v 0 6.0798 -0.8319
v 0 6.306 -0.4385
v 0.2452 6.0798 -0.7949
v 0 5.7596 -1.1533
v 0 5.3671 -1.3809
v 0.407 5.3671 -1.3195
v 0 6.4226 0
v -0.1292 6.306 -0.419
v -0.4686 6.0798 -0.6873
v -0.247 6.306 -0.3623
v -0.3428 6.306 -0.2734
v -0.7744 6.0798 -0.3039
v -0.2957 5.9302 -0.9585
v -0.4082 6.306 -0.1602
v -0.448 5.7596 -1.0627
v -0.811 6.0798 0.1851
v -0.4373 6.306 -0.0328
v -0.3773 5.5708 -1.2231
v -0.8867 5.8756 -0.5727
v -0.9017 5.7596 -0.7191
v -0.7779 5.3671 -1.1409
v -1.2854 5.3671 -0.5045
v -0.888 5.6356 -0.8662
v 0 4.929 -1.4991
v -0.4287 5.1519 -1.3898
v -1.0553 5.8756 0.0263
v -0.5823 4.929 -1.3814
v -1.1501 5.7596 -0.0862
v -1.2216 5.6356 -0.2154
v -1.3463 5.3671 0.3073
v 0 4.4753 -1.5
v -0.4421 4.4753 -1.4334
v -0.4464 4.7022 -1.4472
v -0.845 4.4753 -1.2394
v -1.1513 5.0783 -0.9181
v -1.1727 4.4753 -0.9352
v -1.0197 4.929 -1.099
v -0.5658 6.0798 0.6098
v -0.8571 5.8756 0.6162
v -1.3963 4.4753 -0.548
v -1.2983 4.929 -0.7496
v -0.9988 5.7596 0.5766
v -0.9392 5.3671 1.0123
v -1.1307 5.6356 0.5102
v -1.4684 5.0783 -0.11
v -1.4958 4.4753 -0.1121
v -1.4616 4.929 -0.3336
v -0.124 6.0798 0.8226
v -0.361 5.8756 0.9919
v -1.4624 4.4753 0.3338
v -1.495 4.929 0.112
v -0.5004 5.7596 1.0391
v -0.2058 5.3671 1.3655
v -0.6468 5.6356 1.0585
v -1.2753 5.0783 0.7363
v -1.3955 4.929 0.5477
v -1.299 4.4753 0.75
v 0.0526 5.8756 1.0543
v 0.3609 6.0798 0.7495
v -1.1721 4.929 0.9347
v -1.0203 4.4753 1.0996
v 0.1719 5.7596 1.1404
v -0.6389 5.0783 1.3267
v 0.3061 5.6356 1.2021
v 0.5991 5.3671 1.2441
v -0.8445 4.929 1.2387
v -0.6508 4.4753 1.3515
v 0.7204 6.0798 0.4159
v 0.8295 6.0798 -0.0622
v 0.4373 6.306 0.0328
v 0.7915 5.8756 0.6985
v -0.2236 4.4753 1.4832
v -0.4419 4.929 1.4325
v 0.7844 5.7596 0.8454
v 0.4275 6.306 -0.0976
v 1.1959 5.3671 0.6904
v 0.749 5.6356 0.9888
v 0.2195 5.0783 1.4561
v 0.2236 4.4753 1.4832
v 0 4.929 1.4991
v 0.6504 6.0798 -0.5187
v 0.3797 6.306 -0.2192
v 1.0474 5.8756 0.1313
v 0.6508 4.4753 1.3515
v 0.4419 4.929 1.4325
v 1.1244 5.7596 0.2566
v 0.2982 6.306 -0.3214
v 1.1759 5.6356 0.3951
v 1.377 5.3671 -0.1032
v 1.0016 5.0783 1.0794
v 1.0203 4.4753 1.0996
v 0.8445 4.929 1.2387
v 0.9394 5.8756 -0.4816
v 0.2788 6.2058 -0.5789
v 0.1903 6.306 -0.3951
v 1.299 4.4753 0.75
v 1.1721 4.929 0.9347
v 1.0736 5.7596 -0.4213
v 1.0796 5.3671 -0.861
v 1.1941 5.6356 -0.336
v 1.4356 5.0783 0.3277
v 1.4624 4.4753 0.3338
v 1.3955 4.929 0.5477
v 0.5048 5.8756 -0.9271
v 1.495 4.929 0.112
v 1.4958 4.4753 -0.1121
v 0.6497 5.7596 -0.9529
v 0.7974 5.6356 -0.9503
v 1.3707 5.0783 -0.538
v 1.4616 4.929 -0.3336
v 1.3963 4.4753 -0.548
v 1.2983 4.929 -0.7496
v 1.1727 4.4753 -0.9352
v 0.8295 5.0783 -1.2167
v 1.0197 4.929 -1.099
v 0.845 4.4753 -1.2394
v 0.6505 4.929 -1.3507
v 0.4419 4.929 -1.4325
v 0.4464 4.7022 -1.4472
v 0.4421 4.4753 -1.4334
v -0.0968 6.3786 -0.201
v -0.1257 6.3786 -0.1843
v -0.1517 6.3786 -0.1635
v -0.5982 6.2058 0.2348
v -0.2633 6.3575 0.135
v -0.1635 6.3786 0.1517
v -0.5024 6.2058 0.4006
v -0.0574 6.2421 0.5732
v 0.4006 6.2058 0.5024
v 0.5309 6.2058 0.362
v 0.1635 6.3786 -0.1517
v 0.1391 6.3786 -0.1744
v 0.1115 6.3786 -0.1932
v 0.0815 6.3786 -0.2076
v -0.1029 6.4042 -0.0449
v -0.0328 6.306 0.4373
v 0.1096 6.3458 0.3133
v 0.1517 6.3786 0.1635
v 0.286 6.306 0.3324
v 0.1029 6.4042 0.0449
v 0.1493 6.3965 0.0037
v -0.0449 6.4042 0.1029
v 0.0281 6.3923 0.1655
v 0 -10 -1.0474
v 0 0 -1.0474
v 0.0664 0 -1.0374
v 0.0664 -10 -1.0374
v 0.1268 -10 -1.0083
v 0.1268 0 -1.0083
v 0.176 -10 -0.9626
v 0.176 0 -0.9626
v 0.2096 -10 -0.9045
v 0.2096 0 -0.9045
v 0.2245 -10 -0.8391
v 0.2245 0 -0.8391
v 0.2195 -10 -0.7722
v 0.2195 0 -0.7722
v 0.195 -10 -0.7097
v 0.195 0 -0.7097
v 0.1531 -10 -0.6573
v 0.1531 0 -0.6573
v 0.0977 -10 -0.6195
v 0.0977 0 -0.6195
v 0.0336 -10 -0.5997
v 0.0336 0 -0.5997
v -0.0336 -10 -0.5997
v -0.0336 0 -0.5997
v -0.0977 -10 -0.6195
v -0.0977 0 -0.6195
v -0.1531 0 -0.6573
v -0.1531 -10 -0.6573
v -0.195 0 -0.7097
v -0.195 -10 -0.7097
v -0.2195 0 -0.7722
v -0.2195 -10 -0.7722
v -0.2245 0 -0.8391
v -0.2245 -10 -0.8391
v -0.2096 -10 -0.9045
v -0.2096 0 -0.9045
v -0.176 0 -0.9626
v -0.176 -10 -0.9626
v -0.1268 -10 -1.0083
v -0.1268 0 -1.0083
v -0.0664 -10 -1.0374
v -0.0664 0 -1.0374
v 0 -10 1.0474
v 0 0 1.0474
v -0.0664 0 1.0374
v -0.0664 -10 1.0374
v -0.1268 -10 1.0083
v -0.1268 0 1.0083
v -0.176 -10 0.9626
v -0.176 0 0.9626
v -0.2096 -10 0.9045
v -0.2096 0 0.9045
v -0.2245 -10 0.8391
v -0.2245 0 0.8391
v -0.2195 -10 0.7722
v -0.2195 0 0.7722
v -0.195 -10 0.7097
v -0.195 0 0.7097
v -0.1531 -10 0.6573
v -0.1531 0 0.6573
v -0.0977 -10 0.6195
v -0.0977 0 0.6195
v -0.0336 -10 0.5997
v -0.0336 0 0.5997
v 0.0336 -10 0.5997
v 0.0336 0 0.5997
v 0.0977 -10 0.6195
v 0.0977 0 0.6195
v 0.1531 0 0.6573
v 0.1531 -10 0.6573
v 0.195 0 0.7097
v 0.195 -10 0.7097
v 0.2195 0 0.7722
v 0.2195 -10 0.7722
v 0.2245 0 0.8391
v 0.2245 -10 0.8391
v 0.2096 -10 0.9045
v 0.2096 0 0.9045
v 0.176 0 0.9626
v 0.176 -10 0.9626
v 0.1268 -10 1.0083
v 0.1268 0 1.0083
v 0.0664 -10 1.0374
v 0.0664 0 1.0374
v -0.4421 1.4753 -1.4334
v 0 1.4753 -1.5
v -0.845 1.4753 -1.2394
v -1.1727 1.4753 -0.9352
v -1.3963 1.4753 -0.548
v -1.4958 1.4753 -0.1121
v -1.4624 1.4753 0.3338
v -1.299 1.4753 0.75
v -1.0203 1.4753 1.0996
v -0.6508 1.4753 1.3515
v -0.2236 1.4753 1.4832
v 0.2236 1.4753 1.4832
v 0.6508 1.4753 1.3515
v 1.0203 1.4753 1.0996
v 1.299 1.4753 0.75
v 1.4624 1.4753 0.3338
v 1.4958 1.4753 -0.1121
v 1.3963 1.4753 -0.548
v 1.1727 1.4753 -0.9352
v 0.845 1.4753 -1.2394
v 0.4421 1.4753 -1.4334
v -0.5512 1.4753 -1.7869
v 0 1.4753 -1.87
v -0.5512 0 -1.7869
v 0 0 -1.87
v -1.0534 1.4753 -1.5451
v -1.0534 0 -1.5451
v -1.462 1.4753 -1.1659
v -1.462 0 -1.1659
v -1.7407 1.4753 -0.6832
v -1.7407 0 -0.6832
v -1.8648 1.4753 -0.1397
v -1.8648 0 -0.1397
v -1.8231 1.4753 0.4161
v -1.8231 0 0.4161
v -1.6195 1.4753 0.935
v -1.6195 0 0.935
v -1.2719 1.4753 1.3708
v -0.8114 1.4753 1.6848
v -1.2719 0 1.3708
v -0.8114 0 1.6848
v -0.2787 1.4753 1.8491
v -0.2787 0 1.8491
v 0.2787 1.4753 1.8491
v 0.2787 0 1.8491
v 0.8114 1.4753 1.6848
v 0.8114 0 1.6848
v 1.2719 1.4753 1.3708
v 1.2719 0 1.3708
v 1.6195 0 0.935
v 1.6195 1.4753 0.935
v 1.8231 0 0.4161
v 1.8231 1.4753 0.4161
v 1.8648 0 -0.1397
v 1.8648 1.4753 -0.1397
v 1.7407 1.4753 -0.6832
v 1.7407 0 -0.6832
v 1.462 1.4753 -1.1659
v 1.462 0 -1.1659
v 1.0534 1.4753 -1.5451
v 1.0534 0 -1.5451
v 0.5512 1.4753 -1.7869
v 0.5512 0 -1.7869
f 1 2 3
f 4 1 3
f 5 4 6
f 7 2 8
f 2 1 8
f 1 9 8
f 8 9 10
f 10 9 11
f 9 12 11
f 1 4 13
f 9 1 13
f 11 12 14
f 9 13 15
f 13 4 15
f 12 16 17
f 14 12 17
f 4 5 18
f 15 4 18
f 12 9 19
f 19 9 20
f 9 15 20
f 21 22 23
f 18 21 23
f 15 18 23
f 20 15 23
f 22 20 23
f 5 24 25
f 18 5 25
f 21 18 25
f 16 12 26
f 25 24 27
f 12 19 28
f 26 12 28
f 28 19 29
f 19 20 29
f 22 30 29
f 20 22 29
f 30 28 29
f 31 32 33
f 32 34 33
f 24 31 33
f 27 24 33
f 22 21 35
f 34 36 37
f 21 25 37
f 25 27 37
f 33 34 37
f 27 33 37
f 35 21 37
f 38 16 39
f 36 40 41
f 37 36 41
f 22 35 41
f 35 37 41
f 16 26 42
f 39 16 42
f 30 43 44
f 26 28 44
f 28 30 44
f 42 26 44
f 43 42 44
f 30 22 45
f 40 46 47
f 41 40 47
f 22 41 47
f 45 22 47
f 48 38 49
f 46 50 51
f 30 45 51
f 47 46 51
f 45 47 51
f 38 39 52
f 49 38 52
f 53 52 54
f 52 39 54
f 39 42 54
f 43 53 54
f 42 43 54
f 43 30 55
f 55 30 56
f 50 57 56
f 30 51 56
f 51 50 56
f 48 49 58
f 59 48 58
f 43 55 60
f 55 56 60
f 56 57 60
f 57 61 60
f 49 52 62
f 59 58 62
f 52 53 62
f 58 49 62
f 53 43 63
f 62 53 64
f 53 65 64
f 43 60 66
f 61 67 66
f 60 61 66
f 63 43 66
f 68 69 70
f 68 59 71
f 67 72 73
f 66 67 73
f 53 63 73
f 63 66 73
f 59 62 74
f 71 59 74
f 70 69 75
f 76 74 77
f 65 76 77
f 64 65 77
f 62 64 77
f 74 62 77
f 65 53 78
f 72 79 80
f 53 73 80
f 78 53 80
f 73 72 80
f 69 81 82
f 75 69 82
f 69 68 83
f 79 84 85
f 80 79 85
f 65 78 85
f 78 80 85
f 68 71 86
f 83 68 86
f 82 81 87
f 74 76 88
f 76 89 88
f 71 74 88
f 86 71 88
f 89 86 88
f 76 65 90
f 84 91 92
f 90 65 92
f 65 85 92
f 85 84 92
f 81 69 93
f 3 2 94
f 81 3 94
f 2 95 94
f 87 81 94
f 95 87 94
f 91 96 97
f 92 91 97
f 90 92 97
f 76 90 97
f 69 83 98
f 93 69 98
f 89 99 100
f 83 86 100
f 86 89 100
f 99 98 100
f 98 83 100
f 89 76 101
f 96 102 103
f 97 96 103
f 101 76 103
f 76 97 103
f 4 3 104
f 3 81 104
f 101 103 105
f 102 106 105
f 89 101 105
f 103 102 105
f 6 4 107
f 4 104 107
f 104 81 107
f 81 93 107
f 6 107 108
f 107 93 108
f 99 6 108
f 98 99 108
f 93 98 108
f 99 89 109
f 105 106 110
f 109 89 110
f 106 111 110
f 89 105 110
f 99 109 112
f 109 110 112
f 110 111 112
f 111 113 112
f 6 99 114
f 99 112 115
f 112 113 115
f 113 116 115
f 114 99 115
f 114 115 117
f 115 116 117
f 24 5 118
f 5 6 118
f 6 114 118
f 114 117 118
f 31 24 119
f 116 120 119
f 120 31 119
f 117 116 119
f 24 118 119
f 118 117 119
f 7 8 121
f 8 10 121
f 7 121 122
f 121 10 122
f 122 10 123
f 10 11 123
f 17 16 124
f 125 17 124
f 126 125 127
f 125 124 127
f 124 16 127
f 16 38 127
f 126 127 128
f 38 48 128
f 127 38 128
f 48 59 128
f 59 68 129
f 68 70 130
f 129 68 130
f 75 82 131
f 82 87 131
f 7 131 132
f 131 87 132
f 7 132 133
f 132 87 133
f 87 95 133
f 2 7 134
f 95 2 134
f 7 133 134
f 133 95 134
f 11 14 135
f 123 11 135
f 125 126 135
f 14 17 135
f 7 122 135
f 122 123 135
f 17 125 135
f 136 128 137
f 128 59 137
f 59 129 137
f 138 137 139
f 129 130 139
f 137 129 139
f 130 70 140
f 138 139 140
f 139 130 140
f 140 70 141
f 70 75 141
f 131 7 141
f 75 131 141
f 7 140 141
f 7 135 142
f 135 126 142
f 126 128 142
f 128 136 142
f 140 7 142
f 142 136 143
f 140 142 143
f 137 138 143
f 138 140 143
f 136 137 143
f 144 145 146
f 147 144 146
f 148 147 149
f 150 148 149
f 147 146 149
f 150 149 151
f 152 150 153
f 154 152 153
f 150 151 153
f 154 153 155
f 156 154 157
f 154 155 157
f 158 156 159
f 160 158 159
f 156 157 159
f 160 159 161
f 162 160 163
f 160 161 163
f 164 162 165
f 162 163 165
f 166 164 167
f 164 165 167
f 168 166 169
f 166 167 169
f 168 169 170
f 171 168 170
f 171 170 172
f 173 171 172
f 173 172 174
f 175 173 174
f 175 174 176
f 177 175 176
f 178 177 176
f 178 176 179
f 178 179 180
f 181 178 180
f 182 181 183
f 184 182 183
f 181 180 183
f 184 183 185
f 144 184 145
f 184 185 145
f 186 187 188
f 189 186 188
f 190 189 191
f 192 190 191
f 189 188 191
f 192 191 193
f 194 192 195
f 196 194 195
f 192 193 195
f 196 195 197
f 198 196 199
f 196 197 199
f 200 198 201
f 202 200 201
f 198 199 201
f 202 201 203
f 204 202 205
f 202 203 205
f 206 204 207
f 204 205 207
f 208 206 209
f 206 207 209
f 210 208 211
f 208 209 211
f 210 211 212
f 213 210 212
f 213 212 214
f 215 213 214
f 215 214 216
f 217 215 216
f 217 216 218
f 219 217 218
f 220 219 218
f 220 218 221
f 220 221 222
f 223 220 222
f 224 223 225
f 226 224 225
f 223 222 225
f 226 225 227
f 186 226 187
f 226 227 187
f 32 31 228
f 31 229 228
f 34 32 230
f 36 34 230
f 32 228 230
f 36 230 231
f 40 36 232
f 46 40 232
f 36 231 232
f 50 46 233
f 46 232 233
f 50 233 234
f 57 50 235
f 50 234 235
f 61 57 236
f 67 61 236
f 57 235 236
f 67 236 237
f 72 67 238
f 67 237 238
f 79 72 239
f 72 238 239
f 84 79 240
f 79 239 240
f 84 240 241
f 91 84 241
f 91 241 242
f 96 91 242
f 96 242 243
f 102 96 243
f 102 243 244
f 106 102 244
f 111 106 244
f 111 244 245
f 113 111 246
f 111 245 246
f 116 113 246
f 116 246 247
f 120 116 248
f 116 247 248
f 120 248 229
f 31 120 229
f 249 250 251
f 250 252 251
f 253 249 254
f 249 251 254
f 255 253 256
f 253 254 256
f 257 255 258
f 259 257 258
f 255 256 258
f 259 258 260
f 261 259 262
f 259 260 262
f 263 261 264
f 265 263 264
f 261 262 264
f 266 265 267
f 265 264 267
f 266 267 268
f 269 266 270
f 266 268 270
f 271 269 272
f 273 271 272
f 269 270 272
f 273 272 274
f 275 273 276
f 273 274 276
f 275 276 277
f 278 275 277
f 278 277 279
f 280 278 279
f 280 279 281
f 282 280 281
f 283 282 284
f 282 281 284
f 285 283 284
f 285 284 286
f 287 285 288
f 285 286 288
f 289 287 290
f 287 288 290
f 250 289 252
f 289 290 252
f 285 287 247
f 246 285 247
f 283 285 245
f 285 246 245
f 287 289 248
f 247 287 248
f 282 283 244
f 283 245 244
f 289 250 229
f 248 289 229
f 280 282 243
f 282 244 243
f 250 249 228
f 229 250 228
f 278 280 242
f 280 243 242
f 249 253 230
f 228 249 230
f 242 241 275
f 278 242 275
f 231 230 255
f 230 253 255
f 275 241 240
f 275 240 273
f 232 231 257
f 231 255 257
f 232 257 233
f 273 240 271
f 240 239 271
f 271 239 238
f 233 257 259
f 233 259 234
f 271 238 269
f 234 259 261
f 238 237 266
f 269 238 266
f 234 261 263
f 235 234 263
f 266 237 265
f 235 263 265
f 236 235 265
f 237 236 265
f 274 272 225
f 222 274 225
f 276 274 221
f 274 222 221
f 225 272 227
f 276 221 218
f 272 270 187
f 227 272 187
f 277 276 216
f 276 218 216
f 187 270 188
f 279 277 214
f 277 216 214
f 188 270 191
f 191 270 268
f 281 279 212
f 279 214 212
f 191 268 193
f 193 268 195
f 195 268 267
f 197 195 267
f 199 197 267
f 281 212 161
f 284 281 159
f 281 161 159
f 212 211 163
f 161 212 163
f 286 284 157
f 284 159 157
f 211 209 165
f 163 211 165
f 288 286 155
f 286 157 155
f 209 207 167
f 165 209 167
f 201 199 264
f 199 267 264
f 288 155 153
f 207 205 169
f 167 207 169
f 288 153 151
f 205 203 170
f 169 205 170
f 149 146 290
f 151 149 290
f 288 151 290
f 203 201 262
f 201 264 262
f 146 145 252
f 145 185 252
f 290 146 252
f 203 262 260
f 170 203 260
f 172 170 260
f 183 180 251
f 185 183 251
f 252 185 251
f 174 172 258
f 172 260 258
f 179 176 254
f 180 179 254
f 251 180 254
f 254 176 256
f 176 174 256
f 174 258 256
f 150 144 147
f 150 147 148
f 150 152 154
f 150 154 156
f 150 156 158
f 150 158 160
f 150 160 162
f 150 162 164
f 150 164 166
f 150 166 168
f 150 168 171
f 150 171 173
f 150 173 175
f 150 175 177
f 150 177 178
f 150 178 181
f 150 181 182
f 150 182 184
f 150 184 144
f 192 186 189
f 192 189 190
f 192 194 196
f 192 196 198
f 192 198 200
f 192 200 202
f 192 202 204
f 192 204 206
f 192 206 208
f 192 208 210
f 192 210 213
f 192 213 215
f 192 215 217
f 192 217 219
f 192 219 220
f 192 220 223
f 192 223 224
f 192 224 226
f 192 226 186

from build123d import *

# Parameters (mm, degrees)
SKETCH2_R           = 0.225118876
BOSS_EXTRUDE1_DEPTH = 10


with BuildPart() as part:
    # Sketch1 → Revolve1 (revolve)
    with BuildSketch(Plane.XY, mode=Mode.PRIVATE) as revolve1_sk:
        with BuildLine():
            Line((0, 0), (0, 6.422564509))
            ThreePointArc((0, 6.422564509), (1.15329097, 5.759594151), (1.5, 4.47530345))
            Line((1.5, 4.47530345), (1.5, 1.47530345))
            Line((1.5, 1.47530345), (1.87, 1.47530345))
            Line((1.87, 1.47530345), (1.87, 0))
            Line((1.87, 0), (0, 0))
        make_face()
    revolve(revolve1_sk.sketch.rotate(Axis((0, 0, 0), (0, 1, 0)), 90), axis=Axis((0, 0, 0), (0, 1, 0)))

    # Sketch2 → Boss-Extrude1 (add)
    with BuildSketch(Plane(origin=(0, 0, 0), x_dir=(-1, 0, 0), z_dir=(0, -1, 0))):
        with Locations(Location((0, 0.822285039, 0), (0, 0, 90))):
            Circle(SKETCH2_R)
        with Locations(Location((0, -0.822285039, 0), (0, 0, 270))):
            Circle(SKETCH2_R)
    extrude(amount=BOSS_EXTRUDE1_DEPTH)


solid = part.part
